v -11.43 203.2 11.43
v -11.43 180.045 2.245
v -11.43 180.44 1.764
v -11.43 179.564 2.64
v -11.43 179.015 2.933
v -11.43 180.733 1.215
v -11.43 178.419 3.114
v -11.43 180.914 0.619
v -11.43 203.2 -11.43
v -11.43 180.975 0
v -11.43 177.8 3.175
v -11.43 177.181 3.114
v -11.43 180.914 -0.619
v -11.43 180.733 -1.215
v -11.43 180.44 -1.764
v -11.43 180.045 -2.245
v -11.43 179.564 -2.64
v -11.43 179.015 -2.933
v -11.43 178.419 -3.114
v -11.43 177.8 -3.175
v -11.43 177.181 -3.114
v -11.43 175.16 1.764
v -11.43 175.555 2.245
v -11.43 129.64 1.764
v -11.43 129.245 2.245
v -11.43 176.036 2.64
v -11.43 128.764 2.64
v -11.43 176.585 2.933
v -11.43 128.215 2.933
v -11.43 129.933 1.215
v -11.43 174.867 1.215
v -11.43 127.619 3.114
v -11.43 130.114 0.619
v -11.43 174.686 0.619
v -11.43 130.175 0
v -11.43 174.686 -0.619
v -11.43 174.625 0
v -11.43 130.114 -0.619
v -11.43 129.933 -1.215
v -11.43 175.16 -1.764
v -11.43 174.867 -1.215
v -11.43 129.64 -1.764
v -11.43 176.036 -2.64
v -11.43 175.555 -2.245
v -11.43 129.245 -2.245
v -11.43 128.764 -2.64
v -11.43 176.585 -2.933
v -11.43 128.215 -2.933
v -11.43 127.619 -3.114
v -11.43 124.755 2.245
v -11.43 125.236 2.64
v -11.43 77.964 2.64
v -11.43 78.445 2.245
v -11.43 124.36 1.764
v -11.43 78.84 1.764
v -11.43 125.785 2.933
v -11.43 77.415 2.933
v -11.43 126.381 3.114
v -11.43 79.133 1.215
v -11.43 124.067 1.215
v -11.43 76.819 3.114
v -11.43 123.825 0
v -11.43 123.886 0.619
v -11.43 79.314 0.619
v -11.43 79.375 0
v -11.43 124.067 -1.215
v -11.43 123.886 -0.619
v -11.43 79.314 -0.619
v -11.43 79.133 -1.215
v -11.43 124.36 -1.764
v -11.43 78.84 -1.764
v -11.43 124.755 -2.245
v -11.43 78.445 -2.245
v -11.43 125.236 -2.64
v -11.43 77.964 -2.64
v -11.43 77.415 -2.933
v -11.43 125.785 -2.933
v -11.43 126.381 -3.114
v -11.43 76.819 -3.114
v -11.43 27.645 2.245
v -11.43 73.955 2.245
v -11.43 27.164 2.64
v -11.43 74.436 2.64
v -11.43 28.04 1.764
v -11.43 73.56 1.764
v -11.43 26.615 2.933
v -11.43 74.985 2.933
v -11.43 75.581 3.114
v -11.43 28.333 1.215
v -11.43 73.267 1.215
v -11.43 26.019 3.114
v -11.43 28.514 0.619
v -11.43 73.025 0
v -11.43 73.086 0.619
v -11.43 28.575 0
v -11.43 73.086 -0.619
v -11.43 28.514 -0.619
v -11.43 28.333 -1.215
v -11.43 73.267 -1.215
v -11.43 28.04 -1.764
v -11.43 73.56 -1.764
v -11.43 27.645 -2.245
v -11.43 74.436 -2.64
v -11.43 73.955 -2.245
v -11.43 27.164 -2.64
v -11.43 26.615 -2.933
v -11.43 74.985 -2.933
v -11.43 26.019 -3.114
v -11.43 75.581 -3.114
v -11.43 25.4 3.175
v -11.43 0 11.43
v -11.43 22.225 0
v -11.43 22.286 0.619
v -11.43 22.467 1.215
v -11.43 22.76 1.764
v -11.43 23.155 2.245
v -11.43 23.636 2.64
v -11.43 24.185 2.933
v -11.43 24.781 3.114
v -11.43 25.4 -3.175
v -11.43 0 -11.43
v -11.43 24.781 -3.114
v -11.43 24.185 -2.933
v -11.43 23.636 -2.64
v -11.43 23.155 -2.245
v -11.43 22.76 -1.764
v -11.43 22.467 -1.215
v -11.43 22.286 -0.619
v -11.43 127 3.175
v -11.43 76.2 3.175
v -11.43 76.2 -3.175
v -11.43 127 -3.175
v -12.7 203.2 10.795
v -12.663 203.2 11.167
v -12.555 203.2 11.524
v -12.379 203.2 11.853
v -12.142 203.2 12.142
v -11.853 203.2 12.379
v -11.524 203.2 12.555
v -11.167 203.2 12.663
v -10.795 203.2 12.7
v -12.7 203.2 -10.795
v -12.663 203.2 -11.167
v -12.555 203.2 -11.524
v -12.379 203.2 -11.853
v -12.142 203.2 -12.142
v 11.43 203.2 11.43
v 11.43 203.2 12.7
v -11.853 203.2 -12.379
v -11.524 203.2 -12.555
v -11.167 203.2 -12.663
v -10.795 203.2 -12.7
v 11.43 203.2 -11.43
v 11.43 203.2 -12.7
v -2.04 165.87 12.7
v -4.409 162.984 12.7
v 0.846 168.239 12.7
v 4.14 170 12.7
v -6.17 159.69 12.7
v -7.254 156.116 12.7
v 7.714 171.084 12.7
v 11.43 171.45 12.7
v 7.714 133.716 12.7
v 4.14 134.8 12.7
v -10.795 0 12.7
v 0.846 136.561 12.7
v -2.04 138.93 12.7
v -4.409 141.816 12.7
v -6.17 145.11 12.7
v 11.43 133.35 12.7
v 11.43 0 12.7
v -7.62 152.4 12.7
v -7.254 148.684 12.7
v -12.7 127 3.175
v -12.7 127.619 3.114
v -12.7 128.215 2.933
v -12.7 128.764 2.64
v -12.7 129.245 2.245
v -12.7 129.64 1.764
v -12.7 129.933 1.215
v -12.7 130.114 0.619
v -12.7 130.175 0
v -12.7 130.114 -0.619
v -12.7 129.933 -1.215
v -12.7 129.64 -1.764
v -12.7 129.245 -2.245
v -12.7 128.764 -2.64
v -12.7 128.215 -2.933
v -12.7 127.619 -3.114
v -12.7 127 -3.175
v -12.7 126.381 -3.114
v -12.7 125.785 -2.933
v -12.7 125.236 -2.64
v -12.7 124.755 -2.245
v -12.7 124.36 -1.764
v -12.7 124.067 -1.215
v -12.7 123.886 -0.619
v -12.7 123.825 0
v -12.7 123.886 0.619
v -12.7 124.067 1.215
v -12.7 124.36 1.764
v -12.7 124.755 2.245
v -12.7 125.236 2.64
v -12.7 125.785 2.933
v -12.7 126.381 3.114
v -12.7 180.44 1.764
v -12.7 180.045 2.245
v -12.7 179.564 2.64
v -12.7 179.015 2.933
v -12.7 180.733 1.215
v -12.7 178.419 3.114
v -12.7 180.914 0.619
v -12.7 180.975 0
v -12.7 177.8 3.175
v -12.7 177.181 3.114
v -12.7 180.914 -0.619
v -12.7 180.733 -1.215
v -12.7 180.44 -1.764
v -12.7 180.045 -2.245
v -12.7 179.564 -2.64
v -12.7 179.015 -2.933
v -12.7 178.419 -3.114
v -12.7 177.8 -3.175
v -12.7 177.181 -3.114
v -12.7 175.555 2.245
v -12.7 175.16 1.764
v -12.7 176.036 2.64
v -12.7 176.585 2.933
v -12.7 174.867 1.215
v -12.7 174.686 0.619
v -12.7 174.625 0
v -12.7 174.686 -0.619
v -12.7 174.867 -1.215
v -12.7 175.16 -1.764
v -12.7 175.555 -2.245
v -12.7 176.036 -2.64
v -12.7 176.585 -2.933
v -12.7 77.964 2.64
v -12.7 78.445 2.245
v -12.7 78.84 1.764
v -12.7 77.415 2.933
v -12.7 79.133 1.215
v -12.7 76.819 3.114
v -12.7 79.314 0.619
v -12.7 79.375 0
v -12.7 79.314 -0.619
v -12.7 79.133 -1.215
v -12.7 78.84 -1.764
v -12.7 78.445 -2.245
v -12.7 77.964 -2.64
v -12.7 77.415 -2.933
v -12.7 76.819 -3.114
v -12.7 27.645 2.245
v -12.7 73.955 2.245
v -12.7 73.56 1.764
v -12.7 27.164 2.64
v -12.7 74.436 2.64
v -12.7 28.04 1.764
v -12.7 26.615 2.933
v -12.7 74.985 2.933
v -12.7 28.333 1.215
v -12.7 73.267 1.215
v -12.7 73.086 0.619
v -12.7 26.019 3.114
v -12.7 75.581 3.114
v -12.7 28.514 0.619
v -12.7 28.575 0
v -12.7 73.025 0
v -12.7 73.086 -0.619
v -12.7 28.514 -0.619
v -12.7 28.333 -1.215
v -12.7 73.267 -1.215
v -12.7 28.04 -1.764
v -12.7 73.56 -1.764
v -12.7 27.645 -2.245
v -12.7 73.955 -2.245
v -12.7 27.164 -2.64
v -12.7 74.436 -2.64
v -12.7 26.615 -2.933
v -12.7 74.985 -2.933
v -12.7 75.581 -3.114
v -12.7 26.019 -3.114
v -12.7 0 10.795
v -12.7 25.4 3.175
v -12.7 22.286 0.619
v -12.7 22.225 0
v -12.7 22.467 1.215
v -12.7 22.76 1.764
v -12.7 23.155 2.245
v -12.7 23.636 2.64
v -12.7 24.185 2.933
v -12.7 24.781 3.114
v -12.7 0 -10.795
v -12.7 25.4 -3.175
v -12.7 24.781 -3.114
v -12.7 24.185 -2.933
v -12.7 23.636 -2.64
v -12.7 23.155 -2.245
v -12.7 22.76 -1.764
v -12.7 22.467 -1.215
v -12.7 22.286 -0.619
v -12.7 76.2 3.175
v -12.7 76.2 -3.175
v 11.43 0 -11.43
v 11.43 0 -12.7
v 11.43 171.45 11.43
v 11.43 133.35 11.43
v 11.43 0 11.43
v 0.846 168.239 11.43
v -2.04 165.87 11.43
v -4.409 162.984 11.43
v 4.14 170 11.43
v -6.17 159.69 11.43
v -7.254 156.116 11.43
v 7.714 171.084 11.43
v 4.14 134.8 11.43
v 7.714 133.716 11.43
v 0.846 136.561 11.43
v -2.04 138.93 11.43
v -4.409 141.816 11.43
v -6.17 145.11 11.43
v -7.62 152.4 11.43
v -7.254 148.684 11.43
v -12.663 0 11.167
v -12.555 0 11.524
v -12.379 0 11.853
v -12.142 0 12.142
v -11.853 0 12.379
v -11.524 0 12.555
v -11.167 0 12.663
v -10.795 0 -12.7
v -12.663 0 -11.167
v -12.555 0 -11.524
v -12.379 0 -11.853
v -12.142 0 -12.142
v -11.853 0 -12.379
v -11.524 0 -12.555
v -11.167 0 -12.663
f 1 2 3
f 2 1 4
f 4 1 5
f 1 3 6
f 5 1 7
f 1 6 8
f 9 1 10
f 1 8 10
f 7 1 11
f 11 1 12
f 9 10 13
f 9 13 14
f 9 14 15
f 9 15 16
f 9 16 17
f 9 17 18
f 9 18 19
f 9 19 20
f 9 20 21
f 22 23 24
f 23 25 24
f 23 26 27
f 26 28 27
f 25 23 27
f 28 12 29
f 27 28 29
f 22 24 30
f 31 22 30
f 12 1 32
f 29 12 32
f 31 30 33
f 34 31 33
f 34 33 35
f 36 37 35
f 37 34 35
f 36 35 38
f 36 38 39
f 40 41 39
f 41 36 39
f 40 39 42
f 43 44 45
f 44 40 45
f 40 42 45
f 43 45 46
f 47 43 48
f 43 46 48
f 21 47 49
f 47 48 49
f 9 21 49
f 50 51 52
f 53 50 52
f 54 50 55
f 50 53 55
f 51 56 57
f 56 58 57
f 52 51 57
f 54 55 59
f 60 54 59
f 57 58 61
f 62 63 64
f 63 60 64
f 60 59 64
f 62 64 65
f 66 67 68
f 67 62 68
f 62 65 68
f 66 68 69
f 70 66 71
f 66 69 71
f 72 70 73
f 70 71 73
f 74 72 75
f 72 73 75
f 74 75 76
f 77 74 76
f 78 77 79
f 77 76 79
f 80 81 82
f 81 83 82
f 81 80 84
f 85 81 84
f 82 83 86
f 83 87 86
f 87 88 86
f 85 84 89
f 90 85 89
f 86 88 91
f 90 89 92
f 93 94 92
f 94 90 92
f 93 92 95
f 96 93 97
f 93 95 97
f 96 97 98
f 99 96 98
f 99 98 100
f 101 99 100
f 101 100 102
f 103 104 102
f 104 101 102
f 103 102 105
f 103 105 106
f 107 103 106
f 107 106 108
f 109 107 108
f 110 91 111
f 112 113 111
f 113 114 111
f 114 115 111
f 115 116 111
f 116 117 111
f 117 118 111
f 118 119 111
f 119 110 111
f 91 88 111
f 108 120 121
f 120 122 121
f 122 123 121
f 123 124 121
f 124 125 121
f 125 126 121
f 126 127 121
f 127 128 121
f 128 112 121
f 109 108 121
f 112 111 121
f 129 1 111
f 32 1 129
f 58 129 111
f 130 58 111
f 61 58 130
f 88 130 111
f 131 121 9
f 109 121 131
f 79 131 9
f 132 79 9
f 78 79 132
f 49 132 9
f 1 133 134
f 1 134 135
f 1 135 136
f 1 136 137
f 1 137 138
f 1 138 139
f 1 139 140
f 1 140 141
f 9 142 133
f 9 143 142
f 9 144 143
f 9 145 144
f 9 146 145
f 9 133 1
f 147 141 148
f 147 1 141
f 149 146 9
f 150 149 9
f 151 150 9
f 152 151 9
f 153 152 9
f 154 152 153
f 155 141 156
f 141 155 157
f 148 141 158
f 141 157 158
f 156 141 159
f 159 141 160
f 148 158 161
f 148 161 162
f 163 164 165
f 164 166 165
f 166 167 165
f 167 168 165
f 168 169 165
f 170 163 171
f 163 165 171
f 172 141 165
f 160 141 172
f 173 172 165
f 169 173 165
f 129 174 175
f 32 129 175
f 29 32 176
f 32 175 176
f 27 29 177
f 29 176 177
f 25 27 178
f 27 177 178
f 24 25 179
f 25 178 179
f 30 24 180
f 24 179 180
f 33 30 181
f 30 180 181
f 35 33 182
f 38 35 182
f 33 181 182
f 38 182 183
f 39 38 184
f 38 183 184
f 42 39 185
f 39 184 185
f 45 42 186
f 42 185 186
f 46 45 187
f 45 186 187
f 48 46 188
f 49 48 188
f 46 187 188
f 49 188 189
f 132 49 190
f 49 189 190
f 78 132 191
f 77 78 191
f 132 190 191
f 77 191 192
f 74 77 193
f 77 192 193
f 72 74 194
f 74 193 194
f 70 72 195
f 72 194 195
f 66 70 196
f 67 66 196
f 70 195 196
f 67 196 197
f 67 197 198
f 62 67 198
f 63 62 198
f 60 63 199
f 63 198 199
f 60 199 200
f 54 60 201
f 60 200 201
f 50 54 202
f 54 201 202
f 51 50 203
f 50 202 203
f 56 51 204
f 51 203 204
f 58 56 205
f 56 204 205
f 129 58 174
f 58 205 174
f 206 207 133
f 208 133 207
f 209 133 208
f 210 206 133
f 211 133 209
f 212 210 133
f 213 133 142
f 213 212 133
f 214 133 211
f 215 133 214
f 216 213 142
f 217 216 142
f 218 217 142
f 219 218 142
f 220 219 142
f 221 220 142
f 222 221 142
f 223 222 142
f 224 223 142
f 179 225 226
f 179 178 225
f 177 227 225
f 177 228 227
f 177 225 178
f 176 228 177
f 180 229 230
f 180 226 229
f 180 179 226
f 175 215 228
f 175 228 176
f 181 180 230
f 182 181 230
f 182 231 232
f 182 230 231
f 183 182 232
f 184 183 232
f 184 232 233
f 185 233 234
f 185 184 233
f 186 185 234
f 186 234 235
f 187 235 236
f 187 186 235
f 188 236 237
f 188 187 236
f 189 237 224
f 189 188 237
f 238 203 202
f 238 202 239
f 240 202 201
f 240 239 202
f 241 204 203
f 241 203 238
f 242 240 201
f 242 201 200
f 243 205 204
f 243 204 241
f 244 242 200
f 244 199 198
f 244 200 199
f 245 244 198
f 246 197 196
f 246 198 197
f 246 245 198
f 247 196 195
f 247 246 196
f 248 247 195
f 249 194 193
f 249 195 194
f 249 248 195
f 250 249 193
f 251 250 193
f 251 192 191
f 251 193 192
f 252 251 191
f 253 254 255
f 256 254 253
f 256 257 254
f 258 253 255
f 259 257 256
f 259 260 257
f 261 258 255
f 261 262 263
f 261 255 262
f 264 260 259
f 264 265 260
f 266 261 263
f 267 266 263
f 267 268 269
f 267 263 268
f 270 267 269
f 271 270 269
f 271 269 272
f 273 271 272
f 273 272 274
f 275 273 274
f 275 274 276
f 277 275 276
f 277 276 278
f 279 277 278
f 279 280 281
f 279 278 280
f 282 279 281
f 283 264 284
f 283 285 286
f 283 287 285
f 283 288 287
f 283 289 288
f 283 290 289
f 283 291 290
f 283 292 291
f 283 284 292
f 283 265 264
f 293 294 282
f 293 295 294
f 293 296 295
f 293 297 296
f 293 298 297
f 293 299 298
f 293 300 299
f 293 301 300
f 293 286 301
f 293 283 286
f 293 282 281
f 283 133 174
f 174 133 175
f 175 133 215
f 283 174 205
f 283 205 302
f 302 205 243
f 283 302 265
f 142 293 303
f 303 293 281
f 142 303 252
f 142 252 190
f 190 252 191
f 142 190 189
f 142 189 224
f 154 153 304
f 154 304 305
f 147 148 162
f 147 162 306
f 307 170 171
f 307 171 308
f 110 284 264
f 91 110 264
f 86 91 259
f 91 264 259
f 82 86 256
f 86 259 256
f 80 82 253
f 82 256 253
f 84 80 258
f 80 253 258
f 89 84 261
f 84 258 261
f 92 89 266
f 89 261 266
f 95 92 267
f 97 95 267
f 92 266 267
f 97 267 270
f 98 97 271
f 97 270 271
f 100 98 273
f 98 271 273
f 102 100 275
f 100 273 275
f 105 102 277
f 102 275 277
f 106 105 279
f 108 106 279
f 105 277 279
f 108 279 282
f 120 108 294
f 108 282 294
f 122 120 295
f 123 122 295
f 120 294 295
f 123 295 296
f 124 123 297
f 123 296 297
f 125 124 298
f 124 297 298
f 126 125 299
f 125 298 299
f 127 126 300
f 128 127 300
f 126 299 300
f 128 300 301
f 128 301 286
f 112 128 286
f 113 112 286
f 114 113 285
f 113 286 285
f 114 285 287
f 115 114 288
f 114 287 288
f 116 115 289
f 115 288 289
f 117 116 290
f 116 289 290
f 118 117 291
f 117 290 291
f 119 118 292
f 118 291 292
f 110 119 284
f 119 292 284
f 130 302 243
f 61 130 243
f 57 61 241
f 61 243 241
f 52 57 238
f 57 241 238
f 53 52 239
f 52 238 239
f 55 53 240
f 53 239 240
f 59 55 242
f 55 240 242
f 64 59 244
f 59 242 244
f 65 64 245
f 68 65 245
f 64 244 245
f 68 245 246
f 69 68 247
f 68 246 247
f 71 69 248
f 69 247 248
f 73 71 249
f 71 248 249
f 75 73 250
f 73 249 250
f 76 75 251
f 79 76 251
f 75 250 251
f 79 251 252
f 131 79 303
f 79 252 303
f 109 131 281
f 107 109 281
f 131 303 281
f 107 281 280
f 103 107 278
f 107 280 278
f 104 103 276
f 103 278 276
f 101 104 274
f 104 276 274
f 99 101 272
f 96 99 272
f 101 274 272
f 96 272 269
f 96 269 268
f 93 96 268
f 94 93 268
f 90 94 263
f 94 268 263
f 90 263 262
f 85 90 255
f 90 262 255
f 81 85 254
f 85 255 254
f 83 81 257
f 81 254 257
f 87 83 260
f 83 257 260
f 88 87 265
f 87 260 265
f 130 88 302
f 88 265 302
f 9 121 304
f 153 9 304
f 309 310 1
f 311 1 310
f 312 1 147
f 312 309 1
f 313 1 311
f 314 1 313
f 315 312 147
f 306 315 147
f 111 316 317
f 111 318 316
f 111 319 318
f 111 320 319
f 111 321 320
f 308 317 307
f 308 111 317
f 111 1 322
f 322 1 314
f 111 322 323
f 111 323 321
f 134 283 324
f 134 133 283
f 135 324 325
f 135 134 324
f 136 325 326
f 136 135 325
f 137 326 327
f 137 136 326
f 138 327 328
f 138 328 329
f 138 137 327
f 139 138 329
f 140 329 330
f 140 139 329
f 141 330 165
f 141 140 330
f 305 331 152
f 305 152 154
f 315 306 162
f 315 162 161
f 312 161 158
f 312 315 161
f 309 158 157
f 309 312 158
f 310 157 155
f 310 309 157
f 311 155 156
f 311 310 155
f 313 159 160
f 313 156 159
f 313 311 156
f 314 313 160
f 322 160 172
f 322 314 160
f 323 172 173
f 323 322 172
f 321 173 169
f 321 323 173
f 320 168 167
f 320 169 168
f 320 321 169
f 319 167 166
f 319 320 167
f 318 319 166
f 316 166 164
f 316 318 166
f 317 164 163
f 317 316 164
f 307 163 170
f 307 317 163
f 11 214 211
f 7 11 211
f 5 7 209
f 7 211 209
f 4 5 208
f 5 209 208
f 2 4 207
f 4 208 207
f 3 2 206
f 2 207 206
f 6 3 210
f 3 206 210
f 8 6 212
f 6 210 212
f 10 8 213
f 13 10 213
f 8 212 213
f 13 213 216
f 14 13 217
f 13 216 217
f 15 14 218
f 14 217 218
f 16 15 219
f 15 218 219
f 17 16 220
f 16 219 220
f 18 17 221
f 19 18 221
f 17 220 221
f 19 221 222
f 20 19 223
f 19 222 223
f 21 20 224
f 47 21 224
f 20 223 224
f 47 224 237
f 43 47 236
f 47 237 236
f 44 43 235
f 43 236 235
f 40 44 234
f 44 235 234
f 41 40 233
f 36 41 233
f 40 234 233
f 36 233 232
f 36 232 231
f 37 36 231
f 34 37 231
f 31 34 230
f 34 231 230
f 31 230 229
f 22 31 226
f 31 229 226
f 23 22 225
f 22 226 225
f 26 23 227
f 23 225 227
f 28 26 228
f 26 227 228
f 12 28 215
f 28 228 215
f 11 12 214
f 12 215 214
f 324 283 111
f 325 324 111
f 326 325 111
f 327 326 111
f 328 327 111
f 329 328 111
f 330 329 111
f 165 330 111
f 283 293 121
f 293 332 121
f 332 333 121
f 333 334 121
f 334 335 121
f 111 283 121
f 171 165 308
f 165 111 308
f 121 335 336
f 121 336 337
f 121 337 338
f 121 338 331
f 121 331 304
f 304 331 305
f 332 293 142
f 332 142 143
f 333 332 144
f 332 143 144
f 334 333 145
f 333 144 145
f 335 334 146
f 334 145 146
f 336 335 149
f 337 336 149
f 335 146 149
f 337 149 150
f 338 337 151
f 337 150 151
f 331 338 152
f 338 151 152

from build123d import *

# Parameters (mm, degrees)
SKETCH1_W               = 25.4
SKETCH1_H               = 25.4
SKETCH1_W_2             = 22.86
SKETCH1_H_2             = 22.86
BOSS_EXTRUDE1_DEPTH     = 203.2
SKETCH2_W               = 25.4
SKETCH2_H               = 203.2
CUT_EXTRUDE1_DEPTH      = 1.27
SKETCH3_R               = 3.175
CUT_EXTRUDE2_DEPTH      = 1.27
CUT_EXTRUDE3_DEPTH      = 206.174779152
CUT_EXTRUDE3_DEPTH_BACK = 2.54
FILLET10_R              = 1.905


with BuildPart() as part:
    # Sketch1 → Boss-Extrude1 (new body)
    with BuildSketch(Plane(origin=(0, 0, 0), x_dir=(1, 0, 0), z_dir=(0, 1, 0))):
        Rectangle(SKETCH1_W, SKETCH1_H)
        Rectangle(SKETCH1_W_2, SKETCH1_H_2, mode=Mode.SUBTRACT)
    extrude(amount=BOSS_EXTRUDE1_DEPTH)

    # Sketch2 → Cut-Extrude1 (cut)
    with BuildSketch(Plane(origin=(12.7, 0, 0), x_dir=(0, 0, -1), z_dir=(1, 0, 0))):
        with Locations((0, 101.6)):
            Rectangle(SKETCH2_W, SKETCH2_H)
    extrude(amount=-CUT_EXTRUDE1_DEPTH, mode=Mode.SUBTRACT)

    # Sketch3 → Cut-Extrude2 (cut)
    with BuildSketch(Plane.ZY.offset(12.7)):
        with Locations((0, 25.4)):
            Circle(SKETCH3_R)
        with Locations((0, 76.2)):
            Circle(SKETCH3_R)
        with Locations((0, 127)):
            Circle(SKETCH3_R)
        with Locations((0, 177.8)):
            Circle(SKETCH3_R)
    extrude(amount=-CUT_EXTRUDE2_DEPTH, mode=Mode.SUBTRACT)

    # Sketch4 → Cut-Extrude3 (cut, two sides: drawn at the far end of the back side and taken through both)
    with BuildSketch(Plane.XY.offset(12.7).offset(-CUT_EXTRUDE3_DEPTH_BACK)):
        with BuildLine():
            Line((367.709421277, 171.45), (11.43, 171.45))
            ThreePointArc((11.43, 171.45), (-7.62, 152.4), (11.43, 133.35))
            Line((11.43, 133.35), (367.709421277, 133.35))
            Line((367.709421277, 133.35), (1080.268263831, 133.35))
            Line((1080.268263831, 133.35), (1080.268263831, 171.45))
            Line((1080.268263831, 171.45), (367.709421277, 171.45))
        make_face()
    extrude(amount=CUT_EXTRUDE3_DEPTH + CUT_EXTRUDE3_DEPTH_BACK, mode=Mode.SUBTRACT)

    # Fillet10
    fillet10_edges = [part.edges().sort_by_distance(p)[0] for p in [
        (-12.7, 101.6, 12.7),
        (-12.7, 101.6, -12.7),
    ]]
    fillet(fillet10_edges, radius=FILLET10_R)


solid = part.part
